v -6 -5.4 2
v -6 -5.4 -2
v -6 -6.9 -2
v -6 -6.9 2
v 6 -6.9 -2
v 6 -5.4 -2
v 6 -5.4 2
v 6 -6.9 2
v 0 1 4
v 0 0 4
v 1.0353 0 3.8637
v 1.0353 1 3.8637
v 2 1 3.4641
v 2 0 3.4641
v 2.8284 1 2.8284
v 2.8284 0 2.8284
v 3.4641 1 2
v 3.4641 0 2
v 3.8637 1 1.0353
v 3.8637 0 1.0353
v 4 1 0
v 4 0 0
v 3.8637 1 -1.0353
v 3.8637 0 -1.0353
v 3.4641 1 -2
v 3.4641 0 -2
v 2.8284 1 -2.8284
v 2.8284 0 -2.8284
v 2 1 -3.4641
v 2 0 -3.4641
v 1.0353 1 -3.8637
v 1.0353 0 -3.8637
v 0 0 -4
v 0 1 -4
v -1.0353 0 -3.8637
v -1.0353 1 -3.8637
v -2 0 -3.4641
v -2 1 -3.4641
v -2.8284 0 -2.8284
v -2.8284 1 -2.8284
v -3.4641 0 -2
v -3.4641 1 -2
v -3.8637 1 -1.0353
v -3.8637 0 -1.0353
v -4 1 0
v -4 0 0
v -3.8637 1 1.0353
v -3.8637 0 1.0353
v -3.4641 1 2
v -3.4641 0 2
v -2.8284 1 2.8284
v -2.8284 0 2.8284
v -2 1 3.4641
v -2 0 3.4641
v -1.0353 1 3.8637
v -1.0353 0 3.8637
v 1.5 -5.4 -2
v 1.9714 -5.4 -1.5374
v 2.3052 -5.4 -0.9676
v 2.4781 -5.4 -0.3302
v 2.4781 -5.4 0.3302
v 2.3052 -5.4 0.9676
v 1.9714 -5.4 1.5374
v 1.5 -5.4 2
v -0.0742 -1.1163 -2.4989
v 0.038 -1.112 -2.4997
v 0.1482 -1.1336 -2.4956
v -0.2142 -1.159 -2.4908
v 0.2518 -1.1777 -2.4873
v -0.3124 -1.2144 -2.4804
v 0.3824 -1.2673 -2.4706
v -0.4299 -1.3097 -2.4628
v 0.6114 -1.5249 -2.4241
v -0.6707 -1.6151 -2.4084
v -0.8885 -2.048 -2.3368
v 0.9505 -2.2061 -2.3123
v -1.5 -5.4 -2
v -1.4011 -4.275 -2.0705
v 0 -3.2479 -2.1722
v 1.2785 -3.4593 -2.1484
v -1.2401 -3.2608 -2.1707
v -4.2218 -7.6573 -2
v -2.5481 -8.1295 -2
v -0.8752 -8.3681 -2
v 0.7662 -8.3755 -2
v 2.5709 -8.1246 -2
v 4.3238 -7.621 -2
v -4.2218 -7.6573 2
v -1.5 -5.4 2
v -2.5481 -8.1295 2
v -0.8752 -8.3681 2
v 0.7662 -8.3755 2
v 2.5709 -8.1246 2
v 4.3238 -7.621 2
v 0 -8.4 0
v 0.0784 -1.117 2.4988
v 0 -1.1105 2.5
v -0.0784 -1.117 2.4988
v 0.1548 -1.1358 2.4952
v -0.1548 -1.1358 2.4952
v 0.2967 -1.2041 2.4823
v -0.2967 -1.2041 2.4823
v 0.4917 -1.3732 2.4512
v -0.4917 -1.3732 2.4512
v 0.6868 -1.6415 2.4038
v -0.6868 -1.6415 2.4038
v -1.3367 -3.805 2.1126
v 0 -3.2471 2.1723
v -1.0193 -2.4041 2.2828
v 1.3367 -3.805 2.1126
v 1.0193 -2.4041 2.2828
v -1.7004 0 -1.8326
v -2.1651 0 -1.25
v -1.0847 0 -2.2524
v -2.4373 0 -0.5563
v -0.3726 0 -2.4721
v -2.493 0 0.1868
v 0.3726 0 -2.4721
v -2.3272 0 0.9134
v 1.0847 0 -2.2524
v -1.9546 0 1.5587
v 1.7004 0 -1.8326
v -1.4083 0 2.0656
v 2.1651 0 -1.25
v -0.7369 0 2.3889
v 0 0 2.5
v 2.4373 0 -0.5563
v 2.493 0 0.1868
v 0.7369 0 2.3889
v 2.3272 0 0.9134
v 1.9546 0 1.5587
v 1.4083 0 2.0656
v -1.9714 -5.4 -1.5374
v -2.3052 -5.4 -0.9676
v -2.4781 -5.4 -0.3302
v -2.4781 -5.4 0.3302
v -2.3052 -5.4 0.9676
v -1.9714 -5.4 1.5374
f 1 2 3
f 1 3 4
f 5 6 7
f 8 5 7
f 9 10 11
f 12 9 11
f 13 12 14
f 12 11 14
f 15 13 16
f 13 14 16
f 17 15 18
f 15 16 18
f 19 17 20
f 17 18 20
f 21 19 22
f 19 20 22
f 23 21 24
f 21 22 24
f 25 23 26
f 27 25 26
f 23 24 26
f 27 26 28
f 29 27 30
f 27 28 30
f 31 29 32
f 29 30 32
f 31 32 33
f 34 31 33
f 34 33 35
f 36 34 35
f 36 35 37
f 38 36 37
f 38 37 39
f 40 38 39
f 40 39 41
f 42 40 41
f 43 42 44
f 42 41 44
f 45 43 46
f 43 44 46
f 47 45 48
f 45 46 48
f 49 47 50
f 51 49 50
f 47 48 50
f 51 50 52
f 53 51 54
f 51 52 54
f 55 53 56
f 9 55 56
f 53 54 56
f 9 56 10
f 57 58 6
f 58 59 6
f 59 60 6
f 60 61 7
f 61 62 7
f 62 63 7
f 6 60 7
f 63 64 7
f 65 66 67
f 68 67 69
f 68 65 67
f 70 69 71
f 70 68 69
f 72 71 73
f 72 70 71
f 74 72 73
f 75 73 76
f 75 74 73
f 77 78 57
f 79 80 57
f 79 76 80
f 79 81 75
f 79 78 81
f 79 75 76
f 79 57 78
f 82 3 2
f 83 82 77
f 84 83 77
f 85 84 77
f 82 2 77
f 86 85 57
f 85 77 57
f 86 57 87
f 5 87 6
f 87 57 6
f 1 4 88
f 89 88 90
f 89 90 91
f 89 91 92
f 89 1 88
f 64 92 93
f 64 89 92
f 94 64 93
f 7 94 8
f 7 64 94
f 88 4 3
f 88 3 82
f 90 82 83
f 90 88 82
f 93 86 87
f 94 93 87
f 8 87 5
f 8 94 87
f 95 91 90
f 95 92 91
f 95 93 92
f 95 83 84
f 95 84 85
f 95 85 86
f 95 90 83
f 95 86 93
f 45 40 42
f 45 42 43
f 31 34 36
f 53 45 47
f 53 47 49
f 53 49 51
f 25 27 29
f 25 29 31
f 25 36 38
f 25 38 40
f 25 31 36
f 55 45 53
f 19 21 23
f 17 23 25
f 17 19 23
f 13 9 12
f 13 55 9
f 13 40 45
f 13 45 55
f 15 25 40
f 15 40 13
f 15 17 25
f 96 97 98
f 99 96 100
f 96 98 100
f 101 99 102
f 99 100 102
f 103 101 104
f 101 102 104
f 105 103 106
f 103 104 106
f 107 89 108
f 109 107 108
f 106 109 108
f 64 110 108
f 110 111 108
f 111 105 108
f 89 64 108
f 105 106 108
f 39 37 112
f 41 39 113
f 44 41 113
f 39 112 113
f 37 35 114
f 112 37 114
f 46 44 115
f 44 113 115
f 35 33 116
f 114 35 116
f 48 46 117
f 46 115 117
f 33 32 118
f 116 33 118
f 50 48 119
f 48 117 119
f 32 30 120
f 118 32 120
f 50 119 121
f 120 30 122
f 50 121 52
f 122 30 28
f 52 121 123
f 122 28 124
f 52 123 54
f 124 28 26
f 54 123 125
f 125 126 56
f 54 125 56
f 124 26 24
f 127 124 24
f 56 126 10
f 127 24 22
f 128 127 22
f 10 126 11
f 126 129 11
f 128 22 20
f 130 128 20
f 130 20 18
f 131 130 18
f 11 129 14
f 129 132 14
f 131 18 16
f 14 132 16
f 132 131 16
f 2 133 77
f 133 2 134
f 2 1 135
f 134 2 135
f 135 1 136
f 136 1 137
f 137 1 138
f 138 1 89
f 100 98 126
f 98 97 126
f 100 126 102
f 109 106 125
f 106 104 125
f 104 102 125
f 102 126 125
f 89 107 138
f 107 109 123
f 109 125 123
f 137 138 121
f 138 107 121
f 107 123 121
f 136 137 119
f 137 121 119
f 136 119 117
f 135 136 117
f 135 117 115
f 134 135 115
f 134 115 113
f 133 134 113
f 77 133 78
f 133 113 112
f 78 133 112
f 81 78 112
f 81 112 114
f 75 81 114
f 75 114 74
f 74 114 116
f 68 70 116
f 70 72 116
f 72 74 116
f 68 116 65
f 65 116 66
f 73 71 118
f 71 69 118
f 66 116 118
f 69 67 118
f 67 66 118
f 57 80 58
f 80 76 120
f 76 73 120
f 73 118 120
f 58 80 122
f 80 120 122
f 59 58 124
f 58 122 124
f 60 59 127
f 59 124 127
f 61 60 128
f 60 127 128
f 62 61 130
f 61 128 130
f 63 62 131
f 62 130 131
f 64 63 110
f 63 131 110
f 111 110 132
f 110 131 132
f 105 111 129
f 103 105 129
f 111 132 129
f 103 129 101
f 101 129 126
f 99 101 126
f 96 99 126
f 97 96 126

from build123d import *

# Parameters (mm, degrees)
SKETCH1_R               = 4
BOSS_EXTRUDE1_DEPTH     = 1
SKETCH2_R               = 2.5
BOSS_EXTRUDE2_DEPTH     = 5.4
SKETCH3_W               = 12
SKETCH3_H               = 4
BOSS_EXTRUDE3_DEPTH     = 3
CUT_EXTRUDE1_DEPTH      = 12.939849245
CUT_EXTRUDE1_DEPTH_BACK = 12.939849245
CUT_EXTRUDE2_DEPTH      = 12.070682133
CUT_EXTRUDE2_DEPTH_BACK = 12.070682133


with BuildPart() as part:
    # Sketch1 → Boss-Extrude1 (new body)
    with BuildSketch(Plane(origin=(0, 0, 0), x_dir=(1, 0, 0), z_dir=(0, 1, 0))):
        with Locations(Location((0, 0, 0), (0, 0, 270))):
            Circle(SKETCH1_R)
    extrude(amount=BOSS_EXTRUDE1_DEPTH)

    # Sketch2 → Boss-Extrude2 (add)
    with BuildSketch(Plane(origin=(0, 0, 0), x_dir=(-1, 0, 0), z_dir=(0, -1, 0))):
        with Locations(Location((0, 0, 0), (0, 0, 270))):
            Circle(SKETCH2_R)
    extrude(amount=BOSS_EXTRUDE2_DEPTH)

    # Sketch3 → Boss-Extrude3 (add)
    with BuildSketch(Plane.XZ.offset(5.4)):
        Rectangle(SKETCH3_W, SKETCH3_H)
    extrude(amount=BOSS_EXTRUDE3_DEPTH)

    # Sketch4 → Cut-Extrude1 (cut, two sides: drawn at the far end of the back side and taken through both)
    with BuildSketch(Plane(origin=(0, 0, -2), x_dir=(-1, 0, 0), z_dir=(0, 0, -1)).offset(-CUT_EXTRUDE1_DEPTH_BACK)):
        with BuildLine():
            Line((-6, -6.9), (-6.927802535, -6.9))
            Line((-6.927802535, -6.9), (-6.927802535, -9.790233254))
            Line((-6.927802535, -9.790233254), (7.497210963, -9.790233254))
            Line((7.497210963, -9.790233254), (7.497210963, -6.84173926))
            Line((7.497210963, -6.84173926), (6, -6.9))
            add(Edge.make_bspline(
                [(6, -6.9), (0, -9.9), (-6, -6.9)],
                knots=[0, 0, 0, 1, 1, 1], degree=2))
        make_face()
    extrude(amount=CUT_EXTRUDE1_DEPTH + CUT_EXTRUDE1_DEPTH_BACK, mode=Mode.SUBTRACT)

    # Sketch5 → Cut-Extrude2 (cut, two sides: drawn at the far end of the back side and taken through both)
    with BuildSketch(Plane(origin=(0, 0, 0), x_dir=(0, 0, -1), z_dir=(1, 0, 0)).offset(-CUT_EXTRUDE2_DEPTH_BACK)):
        with BuildLine():
            Line((2.5, -1.11050973), (3.286969074, -1.11050973))
            Line((3.286969074, -1.11050973), (3.286969074, -6.28949027))
            Line((3.286969074, -6.28949027), (2, -5.4))
            add(Edge.make_bspline(
                [(2.5, -1.11050973), (2.094671437, -3.238964164), (2, -5.4)],
                knots=[0, 0, 0, 1, 1, 1], degree=2))
        make_face()
        with BuildLine():
            Line((-3.286969074, -6.28949027), (-2, -5.4))
            add(Edge.make_bspline(
                [(-2.5, -1.11050973), (-2.094671437, -3.238964164), (-2, -5.4)],
                knots=[0, 0, 0, 1, 1, 1], degree=2))
            Line((-2.5, -1.11050973), (-3.286969074, -1.11050973))
            Line((-3.286969074, -1.11050973), (-3.286969074, -6.28949027))
        make_face()
    extrude(amount=CUT_EXTRUDE2_DEPTH + CUT_EXTRUDE2_DEPTH_BACK, mode=Mode.SUBTRACT)


solid = part.part
